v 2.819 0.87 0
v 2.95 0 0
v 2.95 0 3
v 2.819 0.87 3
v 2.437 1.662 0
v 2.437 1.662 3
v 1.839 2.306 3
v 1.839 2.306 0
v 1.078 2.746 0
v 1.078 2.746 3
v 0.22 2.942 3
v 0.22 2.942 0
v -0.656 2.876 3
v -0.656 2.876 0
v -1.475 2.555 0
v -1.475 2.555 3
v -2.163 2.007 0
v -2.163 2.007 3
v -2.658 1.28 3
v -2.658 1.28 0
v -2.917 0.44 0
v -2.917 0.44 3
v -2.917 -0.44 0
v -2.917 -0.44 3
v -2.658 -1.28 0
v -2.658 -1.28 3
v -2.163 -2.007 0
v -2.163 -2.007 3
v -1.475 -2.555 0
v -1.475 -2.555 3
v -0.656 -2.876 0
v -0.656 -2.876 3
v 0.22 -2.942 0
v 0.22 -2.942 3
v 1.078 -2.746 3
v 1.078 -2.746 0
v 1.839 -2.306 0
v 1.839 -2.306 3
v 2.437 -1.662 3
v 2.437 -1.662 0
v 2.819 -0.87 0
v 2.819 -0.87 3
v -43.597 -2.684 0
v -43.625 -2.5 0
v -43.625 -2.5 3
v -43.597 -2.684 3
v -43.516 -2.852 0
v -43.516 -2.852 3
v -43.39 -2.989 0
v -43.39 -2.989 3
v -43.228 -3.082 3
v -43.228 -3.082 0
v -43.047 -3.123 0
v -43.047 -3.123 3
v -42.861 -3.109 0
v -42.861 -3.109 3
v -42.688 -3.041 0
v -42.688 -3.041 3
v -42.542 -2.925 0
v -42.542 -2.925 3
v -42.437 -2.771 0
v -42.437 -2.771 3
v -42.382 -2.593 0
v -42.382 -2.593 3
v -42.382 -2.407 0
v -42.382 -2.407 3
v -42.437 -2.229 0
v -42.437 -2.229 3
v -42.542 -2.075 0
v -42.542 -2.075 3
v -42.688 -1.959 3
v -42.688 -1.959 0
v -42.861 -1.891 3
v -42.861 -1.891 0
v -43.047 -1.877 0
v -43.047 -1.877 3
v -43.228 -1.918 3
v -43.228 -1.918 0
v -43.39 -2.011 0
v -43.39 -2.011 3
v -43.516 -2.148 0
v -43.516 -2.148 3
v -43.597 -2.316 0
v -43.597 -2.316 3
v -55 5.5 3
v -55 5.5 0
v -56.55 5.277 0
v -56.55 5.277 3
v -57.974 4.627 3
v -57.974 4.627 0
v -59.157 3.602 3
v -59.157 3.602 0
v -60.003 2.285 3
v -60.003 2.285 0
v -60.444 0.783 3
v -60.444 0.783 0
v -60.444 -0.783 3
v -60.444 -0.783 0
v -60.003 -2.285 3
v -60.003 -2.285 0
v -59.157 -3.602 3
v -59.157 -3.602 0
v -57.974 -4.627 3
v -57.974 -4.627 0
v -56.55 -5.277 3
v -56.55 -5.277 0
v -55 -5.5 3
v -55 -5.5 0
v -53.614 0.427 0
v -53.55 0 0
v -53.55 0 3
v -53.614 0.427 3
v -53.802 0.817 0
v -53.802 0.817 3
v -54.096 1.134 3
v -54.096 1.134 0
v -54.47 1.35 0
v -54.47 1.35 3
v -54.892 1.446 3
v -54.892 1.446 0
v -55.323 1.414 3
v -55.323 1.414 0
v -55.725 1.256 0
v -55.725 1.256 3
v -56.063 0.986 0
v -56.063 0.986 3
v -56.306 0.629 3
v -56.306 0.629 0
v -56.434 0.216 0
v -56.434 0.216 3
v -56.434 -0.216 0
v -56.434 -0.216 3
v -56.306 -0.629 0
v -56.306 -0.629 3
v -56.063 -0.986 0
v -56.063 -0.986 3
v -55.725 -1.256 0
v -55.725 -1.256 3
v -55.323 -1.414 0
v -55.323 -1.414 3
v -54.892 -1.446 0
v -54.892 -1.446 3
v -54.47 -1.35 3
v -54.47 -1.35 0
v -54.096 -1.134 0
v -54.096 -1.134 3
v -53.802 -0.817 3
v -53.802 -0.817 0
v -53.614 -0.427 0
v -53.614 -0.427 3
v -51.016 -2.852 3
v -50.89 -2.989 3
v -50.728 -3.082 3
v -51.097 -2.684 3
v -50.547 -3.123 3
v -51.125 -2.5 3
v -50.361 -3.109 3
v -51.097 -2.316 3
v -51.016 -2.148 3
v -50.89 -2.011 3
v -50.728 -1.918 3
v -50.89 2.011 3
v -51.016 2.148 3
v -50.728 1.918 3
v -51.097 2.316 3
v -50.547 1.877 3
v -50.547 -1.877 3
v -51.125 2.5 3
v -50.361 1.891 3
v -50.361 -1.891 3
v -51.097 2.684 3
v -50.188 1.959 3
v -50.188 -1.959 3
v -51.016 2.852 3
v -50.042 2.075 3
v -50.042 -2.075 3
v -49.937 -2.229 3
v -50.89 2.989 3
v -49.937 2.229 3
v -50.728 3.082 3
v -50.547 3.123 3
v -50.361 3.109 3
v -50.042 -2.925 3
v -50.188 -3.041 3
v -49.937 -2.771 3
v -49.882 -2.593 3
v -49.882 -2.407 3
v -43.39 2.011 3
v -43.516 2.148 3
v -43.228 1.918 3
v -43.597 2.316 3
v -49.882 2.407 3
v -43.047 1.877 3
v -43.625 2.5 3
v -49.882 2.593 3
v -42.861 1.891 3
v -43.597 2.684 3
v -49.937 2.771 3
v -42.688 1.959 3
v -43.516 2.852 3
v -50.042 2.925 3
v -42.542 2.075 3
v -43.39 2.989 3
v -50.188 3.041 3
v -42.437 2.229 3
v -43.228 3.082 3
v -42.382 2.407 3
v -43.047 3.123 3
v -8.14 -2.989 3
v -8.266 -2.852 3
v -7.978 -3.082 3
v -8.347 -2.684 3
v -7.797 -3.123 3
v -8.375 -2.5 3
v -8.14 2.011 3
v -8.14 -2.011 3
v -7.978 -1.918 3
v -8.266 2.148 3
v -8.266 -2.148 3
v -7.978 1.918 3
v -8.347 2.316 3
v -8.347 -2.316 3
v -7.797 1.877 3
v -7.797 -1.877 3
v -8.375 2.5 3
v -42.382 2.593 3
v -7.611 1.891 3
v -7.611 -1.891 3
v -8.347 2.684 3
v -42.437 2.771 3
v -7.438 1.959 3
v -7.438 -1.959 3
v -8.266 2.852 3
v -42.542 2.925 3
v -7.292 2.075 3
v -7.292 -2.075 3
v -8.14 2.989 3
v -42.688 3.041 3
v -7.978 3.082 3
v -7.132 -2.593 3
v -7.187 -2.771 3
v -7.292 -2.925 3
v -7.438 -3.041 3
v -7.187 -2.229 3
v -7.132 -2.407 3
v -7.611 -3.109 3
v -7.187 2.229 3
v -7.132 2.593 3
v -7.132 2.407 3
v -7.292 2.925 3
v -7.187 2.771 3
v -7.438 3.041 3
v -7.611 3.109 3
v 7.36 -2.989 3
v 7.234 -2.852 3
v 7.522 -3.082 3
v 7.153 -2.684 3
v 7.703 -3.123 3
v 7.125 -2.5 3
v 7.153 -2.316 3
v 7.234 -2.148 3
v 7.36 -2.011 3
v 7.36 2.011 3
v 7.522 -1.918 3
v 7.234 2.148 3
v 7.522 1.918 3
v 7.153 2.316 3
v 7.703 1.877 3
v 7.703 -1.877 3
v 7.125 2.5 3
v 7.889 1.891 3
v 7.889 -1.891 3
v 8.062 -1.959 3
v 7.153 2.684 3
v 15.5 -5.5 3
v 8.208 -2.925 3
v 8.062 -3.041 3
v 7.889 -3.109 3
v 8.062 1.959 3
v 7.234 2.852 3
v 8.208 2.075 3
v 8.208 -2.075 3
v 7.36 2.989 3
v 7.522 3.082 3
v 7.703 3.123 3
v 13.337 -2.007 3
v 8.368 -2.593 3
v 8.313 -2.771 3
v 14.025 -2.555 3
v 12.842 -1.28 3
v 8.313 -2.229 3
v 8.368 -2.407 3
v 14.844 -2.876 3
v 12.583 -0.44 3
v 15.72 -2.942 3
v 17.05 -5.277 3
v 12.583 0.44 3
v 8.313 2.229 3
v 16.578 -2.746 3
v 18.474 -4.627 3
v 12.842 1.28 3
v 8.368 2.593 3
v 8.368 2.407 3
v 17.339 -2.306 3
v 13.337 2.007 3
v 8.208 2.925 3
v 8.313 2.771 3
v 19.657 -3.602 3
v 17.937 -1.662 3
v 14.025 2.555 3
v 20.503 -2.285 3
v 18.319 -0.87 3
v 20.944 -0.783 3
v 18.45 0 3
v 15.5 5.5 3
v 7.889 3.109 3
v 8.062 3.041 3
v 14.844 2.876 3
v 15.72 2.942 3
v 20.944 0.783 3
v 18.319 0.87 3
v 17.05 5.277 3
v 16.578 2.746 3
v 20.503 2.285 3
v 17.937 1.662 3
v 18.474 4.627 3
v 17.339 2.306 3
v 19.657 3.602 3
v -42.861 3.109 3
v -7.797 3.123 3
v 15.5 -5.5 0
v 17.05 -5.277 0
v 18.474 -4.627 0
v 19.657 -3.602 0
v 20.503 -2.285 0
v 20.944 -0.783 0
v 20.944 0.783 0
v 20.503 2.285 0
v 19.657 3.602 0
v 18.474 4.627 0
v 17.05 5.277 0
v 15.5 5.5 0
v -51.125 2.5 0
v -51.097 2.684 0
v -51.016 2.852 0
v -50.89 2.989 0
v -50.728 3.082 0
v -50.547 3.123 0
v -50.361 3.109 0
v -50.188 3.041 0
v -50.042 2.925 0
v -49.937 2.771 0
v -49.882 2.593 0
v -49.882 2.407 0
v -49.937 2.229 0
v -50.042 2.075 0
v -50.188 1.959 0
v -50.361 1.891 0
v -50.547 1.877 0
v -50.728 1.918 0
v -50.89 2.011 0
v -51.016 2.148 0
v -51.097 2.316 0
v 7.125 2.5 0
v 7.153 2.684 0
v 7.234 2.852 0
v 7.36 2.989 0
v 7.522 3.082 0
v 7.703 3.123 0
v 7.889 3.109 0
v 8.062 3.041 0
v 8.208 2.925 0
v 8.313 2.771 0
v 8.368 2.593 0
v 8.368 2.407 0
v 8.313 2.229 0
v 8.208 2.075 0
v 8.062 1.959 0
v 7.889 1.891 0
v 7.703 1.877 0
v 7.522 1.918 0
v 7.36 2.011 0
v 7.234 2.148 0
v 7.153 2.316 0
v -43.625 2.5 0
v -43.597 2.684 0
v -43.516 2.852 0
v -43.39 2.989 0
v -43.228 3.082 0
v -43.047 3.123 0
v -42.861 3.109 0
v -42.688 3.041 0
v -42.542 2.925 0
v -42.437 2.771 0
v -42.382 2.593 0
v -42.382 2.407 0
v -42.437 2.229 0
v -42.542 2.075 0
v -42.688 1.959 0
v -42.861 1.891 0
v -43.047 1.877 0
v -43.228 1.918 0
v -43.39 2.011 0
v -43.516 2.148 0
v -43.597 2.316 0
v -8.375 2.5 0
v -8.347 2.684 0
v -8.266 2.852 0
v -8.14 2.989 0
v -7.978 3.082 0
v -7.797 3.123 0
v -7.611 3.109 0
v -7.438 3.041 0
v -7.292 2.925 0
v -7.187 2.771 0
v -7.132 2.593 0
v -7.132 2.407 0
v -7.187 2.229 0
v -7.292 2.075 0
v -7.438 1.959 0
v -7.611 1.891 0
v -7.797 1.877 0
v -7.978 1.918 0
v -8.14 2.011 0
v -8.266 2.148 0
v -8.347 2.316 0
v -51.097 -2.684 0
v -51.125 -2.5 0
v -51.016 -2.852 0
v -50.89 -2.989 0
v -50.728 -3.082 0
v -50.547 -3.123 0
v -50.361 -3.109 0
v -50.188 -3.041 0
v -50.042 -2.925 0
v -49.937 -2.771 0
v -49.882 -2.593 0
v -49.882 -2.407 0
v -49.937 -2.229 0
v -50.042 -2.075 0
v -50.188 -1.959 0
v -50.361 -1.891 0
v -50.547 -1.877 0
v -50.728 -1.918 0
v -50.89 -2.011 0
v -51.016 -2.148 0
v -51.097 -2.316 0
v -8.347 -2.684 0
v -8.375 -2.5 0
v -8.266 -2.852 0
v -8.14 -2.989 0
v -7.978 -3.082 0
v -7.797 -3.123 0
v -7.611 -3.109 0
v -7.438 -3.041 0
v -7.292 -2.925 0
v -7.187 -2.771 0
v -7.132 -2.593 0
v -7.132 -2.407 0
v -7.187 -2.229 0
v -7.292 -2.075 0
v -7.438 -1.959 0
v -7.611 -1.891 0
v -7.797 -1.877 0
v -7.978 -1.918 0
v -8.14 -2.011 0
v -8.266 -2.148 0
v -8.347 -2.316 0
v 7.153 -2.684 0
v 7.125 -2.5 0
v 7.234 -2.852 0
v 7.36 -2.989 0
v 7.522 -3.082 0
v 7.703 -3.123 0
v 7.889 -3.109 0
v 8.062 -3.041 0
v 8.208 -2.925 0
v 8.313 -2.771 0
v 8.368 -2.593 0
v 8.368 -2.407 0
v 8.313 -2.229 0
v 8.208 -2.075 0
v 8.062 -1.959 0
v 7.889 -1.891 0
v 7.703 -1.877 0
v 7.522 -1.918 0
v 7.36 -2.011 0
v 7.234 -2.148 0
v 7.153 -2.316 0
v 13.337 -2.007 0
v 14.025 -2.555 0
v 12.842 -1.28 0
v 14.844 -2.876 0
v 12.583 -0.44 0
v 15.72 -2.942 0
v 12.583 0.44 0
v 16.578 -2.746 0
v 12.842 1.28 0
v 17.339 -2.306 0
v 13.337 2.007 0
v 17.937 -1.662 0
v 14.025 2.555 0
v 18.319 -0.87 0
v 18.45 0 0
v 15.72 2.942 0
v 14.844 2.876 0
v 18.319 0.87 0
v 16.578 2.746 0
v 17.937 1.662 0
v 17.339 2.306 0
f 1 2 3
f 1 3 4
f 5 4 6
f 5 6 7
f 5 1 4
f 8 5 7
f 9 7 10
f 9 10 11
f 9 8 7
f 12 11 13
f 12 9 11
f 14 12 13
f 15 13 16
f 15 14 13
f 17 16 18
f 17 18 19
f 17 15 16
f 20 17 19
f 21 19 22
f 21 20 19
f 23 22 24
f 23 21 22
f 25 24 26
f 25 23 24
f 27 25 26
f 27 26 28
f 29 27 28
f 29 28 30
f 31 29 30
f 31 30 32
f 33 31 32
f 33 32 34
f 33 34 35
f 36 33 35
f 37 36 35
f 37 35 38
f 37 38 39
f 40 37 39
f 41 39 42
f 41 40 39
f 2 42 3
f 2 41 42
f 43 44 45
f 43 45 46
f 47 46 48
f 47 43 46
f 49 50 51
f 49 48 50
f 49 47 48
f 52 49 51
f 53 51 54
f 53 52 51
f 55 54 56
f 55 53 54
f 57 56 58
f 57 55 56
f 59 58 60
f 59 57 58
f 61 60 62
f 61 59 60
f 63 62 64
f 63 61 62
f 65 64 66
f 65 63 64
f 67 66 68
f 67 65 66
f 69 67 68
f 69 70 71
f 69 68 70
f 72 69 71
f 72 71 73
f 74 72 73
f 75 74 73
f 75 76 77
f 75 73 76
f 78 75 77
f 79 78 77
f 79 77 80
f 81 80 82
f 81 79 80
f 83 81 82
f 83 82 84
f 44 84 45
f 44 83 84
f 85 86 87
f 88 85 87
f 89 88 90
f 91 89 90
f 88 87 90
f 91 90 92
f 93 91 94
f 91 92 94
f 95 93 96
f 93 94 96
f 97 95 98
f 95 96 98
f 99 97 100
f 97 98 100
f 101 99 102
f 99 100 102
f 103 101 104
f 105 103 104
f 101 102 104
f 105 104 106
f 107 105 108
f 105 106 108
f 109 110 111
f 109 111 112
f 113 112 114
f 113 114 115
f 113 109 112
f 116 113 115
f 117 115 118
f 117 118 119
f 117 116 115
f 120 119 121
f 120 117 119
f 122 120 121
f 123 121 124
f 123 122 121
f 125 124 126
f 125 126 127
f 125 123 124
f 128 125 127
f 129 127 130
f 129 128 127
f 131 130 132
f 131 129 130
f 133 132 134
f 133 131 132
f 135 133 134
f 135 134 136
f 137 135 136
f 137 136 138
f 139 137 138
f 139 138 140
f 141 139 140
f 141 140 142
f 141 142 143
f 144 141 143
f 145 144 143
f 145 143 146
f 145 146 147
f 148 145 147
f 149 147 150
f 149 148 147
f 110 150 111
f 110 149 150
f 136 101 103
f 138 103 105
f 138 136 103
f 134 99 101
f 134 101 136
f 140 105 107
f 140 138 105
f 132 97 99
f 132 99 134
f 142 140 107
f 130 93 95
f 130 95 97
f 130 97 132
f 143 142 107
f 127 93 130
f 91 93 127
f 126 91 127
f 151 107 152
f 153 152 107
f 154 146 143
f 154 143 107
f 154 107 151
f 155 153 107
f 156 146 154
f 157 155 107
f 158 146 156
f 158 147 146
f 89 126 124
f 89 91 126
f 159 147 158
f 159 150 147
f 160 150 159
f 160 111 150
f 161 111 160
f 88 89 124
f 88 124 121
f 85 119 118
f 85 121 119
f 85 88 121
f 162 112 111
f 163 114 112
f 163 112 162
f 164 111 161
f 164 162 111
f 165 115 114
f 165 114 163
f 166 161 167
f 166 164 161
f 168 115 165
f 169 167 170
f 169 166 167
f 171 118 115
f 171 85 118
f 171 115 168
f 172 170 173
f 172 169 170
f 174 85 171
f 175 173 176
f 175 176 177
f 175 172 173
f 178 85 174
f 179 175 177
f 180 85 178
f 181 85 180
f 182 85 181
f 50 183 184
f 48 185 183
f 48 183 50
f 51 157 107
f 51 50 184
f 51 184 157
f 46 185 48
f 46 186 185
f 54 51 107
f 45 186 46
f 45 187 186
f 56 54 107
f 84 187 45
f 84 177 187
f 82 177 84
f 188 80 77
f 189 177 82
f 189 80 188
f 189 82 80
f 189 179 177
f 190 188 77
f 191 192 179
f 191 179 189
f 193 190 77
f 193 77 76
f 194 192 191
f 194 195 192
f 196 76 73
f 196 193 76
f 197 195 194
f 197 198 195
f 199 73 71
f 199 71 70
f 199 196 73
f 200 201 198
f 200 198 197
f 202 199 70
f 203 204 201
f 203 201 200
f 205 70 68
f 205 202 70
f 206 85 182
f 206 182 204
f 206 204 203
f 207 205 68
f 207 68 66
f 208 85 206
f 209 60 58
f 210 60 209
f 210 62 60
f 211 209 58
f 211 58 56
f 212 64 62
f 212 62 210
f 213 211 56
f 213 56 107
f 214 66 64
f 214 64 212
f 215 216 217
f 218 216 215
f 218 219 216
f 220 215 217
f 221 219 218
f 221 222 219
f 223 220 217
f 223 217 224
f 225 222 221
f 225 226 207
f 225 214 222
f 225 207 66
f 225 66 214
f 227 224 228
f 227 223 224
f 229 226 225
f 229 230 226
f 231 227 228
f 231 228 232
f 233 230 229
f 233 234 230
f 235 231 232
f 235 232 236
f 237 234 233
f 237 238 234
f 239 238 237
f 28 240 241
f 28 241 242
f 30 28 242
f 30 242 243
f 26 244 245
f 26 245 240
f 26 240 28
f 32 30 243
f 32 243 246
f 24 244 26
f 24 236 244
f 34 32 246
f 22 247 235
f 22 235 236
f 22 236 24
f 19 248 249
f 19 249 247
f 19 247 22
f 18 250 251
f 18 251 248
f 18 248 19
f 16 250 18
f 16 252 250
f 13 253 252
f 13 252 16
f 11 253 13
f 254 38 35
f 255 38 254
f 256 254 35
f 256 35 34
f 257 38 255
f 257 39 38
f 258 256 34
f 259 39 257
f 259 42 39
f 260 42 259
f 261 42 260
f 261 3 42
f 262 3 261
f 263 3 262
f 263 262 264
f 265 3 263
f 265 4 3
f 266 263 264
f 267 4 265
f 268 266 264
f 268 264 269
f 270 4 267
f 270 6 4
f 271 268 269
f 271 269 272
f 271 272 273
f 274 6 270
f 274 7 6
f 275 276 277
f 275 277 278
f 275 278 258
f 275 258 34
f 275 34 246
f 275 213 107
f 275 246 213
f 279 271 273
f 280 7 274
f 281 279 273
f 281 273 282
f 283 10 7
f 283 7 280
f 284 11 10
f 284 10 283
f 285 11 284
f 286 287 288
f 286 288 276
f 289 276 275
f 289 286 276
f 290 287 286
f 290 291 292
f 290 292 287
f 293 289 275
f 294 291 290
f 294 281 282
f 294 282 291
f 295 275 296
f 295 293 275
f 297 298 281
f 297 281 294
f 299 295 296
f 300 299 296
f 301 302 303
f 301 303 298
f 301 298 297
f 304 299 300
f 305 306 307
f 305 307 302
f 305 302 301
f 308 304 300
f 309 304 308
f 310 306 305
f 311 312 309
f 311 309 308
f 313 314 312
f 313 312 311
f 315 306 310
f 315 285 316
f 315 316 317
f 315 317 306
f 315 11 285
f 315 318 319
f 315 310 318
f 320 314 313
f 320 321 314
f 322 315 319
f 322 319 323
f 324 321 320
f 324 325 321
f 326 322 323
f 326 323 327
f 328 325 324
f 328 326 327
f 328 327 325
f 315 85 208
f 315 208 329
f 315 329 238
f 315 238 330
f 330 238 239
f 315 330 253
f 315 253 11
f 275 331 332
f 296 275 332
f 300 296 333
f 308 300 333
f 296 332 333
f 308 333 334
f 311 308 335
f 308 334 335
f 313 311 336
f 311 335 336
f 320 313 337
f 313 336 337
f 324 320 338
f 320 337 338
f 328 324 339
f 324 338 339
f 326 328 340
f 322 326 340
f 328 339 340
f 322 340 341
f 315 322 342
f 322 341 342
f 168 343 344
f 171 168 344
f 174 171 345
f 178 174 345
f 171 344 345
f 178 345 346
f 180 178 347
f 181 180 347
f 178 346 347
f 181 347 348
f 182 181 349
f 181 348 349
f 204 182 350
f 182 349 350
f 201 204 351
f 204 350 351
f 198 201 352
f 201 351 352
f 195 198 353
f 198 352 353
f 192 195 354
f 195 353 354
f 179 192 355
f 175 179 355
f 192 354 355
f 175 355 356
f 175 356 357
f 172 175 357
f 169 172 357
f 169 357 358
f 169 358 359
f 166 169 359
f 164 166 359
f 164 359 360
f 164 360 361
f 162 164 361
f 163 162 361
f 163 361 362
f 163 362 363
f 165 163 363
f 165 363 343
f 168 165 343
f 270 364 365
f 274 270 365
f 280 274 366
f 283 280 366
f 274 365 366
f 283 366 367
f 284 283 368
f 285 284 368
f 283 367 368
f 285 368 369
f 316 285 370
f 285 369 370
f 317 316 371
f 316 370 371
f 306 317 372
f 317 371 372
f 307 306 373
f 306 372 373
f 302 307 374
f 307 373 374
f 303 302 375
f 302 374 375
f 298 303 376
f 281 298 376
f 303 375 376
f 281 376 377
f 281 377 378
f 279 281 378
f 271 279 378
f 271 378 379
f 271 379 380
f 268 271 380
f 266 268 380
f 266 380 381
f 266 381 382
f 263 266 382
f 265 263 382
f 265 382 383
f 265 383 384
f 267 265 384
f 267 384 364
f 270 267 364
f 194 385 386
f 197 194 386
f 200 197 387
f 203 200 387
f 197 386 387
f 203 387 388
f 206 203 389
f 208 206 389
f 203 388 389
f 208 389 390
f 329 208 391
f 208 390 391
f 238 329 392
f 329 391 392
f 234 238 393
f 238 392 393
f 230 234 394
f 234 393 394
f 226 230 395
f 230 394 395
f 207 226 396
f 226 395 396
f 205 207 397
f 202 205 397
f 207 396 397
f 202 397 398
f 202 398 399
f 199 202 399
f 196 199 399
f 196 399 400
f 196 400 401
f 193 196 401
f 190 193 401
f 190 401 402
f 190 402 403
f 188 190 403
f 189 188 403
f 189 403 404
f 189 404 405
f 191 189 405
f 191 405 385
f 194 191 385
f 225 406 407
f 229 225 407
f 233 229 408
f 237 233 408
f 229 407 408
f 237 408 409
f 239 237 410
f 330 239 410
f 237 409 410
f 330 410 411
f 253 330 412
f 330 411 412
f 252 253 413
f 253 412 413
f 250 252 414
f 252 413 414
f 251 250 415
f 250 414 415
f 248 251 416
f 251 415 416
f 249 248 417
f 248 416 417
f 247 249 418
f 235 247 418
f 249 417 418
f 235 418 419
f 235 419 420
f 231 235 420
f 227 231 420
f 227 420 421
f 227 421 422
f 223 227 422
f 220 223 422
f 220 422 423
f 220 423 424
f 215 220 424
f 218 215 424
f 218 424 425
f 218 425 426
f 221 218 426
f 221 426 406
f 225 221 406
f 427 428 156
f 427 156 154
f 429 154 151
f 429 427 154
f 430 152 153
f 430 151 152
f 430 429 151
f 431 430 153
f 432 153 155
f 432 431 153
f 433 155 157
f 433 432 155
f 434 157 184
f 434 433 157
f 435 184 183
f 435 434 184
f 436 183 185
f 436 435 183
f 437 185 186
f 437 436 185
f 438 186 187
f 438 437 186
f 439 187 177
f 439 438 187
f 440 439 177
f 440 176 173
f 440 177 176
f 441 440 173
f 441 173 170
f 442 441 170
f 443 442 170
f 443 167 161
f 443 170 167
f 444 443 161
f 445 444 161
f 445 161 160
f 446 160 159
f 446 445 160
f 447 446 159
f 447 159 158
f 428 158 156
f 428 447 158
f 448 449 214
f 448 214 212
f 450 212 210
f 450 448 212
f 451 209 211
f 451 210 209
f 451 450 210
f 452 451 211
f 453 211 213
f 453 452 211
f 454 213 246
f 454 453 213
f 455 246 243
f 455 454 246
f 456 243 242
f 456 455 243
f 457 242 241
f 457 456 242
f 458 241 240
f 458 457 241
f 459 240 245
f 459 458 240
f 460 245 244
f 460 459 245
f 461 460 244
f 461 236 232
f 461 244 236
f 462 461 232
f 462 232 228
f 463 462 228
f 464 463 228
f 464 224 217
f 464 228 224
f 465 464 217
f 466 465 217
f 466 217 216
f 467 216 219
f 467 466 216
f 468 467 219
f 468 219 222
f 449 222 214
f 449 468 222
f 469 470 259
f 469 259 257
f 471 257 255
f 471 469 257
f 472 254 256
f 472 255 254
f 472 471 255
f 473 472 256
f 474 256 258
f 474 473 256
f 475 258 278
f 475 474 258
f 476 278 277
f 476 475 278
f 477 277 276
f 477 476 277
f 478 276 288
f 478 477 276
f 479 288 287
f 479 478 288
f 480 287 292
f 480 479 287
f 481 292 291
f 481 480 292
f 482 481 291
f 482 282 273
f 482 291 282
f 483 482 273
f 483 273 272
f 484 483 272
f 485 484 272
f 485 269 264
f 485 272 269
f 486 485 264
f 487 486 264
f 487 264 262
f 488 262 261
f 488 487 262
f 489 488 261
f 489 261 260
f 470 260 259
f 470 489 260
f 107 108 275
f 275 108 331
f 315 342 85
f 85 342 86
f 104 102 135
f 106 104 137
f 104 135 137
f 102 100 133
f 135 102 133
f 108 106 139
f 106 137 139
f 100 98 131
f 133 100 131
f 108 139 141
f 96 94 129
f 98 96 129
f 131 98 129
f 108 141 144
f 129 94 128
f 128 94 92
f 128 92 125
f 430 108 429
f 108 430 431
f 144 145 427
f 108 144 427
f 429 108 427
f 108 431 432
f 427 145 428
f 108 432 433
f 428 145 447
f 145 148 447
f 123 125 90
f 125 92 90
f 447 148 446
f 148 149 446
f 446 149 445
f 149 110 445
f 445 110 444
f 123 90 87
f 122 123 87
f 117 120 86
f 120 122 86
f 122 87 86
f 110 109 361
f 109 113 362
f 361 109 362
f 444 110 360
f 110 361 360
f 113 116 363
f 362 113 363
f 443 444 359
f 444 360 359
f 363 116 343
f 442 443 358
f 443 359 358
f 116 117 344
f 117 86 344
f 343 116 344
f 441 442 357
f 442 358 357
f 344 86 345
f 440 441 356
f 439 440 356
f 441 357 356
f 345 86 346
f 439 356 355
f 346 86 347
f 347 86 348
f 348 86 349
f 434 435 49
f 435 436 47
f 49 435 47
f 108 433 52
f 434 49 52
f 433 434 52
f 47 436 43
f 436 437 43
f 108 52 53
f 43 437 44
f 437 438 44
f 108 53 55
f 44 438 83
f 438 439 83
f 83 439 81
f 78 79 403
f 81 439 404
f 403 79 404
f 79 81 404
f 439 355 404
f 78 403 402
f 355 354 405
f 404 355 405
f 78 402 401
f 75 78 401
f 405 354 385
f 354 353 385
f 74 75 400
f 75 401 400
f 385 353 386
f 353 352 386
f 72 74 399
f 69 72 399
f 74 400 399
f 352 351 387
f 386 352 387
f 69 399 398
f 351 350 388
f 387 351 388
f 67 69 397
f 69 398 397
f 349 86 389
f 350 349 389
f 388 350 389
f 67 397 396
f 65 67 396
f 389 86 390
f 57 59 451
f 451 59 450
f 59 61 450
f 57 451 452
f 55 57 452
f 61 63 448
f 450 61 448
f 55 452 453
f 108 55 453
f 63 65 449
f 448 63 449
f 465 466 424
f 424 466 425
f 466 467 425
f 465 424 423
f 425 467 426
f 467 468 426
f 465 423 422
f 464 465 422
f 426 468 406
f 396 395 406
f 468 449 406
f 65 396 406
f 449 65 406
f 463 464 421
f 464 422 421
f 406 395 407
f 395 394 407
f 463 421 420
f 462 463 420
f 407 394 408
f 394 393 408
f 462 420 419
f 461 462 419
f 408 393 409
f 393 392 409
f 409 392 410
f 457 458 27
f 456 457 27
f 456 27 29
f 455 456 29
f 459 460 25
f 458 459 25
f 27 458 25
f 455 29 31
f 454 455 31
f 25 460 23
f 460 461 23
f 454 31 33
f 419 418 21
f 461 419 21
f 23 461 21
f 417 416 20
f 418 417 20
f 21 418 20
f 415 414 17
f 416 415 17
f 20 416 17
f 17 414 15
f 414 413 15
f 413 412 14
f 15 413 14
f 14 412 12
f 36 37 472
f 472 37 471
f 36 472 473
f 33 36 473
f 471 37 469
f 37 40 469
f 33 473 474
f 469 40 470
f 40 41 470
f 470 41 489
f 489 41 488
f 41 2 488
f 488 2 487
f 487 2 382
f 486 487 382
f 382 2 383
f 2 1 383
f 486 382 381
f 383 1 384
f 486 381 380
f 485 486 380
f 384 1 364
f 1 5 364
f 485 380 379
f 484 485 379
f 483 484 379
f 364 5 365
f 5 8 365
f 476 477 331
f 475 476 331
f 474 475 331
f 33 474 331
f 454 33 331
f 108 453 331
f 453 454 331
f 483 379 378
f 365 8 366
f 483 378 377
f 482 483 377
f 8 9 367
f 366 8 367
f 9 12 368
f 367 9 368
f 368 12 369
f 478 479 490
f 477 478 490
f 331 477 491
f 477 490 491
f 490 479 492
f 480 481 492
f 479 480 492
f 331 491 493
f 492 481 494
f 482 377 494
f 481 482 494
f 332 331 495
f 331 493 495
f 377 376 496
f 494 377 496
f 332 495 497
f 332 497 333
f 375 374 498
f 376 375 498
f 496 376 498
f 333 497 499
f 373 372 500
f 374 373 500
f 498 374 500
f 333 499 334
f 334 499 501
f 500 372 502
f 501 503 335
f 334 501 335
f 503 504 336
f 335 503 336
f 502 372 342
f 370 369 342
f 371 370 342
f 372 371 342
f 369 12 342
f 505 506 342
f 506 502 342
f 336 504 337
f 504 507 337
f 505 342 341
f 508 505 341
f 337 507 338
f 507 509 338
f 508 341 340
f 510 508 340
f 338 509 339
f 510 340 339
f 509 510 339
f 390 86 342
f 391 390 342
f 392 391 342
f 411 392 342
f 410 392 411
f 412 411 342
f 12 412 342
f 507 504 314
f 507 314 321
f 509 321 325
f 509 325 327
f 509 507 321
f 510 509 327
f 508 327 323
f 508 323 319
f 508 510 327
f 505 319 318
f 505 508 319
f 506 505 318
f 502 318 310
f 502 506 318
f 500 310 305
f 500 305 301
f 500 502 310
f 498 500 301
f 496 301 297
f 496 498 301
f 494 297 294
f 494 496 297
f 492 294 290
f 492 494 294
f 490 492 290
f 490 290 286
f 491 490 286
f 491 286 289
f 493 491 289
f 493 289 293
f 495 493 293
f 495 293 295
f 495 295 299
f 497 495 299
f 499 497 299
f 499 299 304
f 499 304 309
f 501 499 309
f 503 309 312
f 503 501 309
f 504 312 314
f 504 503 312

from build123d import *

# Parameters (mm, degrees)
SKETCH1_R           = 1.45
SKETCH1_R_2         = 2.95
BOSS_EXTRUDE1_DEPTH = 3
TROU_TARAUD_M1_61_D = 1.25


with BuildPart() as part:
    # Sketch1 → Boss-Extrude1 (new body)
    with BuildSketch(Plane.XY):
        with BuildLine():
            Line((15.5, 5.5), (-55, 5.5))
            ThreePointArc((-55, 5.5), (-60.5, 0), (-55, -5.5))
            Line((-55, -5.5), (15.5, -5.5))
            ThreePointArc((15.5, -5.5), (21, 0), (15.5, 5.5))
        make_face()
        with Locations((-55, 0)):
            Circle(SKETCH1_R, mode=Mode.SUBTRACT)
        Circle(SKETCH1_R_2, mode=Mode.SUBTRACT)
        with Locations((15.5, 0)):
            Circle(SKETCH1_R_2, mode=Mode.SUBTRACT)
    extrude(amount=BOSS_EXTRUDE1_DEPTH)

    # Trou taraudé M1.61 (through all)
    with Locations(Plane.XY.offset(3)):
        with Locations((7.75, 2.5), (-7.75, 2.5), (-50.5, 2.5), (-43, 2.5)):
            trou_taraud_m1_61 = Hole(TROU_TARAUD_M1_61_D / 2)

    # Mirror1: Trou taraudé M1.61 across plane
    add(trou_taraud_m1_61.mirror(Plane.ZX), mode=Mode.SUBTRACT)


solid = part.part
